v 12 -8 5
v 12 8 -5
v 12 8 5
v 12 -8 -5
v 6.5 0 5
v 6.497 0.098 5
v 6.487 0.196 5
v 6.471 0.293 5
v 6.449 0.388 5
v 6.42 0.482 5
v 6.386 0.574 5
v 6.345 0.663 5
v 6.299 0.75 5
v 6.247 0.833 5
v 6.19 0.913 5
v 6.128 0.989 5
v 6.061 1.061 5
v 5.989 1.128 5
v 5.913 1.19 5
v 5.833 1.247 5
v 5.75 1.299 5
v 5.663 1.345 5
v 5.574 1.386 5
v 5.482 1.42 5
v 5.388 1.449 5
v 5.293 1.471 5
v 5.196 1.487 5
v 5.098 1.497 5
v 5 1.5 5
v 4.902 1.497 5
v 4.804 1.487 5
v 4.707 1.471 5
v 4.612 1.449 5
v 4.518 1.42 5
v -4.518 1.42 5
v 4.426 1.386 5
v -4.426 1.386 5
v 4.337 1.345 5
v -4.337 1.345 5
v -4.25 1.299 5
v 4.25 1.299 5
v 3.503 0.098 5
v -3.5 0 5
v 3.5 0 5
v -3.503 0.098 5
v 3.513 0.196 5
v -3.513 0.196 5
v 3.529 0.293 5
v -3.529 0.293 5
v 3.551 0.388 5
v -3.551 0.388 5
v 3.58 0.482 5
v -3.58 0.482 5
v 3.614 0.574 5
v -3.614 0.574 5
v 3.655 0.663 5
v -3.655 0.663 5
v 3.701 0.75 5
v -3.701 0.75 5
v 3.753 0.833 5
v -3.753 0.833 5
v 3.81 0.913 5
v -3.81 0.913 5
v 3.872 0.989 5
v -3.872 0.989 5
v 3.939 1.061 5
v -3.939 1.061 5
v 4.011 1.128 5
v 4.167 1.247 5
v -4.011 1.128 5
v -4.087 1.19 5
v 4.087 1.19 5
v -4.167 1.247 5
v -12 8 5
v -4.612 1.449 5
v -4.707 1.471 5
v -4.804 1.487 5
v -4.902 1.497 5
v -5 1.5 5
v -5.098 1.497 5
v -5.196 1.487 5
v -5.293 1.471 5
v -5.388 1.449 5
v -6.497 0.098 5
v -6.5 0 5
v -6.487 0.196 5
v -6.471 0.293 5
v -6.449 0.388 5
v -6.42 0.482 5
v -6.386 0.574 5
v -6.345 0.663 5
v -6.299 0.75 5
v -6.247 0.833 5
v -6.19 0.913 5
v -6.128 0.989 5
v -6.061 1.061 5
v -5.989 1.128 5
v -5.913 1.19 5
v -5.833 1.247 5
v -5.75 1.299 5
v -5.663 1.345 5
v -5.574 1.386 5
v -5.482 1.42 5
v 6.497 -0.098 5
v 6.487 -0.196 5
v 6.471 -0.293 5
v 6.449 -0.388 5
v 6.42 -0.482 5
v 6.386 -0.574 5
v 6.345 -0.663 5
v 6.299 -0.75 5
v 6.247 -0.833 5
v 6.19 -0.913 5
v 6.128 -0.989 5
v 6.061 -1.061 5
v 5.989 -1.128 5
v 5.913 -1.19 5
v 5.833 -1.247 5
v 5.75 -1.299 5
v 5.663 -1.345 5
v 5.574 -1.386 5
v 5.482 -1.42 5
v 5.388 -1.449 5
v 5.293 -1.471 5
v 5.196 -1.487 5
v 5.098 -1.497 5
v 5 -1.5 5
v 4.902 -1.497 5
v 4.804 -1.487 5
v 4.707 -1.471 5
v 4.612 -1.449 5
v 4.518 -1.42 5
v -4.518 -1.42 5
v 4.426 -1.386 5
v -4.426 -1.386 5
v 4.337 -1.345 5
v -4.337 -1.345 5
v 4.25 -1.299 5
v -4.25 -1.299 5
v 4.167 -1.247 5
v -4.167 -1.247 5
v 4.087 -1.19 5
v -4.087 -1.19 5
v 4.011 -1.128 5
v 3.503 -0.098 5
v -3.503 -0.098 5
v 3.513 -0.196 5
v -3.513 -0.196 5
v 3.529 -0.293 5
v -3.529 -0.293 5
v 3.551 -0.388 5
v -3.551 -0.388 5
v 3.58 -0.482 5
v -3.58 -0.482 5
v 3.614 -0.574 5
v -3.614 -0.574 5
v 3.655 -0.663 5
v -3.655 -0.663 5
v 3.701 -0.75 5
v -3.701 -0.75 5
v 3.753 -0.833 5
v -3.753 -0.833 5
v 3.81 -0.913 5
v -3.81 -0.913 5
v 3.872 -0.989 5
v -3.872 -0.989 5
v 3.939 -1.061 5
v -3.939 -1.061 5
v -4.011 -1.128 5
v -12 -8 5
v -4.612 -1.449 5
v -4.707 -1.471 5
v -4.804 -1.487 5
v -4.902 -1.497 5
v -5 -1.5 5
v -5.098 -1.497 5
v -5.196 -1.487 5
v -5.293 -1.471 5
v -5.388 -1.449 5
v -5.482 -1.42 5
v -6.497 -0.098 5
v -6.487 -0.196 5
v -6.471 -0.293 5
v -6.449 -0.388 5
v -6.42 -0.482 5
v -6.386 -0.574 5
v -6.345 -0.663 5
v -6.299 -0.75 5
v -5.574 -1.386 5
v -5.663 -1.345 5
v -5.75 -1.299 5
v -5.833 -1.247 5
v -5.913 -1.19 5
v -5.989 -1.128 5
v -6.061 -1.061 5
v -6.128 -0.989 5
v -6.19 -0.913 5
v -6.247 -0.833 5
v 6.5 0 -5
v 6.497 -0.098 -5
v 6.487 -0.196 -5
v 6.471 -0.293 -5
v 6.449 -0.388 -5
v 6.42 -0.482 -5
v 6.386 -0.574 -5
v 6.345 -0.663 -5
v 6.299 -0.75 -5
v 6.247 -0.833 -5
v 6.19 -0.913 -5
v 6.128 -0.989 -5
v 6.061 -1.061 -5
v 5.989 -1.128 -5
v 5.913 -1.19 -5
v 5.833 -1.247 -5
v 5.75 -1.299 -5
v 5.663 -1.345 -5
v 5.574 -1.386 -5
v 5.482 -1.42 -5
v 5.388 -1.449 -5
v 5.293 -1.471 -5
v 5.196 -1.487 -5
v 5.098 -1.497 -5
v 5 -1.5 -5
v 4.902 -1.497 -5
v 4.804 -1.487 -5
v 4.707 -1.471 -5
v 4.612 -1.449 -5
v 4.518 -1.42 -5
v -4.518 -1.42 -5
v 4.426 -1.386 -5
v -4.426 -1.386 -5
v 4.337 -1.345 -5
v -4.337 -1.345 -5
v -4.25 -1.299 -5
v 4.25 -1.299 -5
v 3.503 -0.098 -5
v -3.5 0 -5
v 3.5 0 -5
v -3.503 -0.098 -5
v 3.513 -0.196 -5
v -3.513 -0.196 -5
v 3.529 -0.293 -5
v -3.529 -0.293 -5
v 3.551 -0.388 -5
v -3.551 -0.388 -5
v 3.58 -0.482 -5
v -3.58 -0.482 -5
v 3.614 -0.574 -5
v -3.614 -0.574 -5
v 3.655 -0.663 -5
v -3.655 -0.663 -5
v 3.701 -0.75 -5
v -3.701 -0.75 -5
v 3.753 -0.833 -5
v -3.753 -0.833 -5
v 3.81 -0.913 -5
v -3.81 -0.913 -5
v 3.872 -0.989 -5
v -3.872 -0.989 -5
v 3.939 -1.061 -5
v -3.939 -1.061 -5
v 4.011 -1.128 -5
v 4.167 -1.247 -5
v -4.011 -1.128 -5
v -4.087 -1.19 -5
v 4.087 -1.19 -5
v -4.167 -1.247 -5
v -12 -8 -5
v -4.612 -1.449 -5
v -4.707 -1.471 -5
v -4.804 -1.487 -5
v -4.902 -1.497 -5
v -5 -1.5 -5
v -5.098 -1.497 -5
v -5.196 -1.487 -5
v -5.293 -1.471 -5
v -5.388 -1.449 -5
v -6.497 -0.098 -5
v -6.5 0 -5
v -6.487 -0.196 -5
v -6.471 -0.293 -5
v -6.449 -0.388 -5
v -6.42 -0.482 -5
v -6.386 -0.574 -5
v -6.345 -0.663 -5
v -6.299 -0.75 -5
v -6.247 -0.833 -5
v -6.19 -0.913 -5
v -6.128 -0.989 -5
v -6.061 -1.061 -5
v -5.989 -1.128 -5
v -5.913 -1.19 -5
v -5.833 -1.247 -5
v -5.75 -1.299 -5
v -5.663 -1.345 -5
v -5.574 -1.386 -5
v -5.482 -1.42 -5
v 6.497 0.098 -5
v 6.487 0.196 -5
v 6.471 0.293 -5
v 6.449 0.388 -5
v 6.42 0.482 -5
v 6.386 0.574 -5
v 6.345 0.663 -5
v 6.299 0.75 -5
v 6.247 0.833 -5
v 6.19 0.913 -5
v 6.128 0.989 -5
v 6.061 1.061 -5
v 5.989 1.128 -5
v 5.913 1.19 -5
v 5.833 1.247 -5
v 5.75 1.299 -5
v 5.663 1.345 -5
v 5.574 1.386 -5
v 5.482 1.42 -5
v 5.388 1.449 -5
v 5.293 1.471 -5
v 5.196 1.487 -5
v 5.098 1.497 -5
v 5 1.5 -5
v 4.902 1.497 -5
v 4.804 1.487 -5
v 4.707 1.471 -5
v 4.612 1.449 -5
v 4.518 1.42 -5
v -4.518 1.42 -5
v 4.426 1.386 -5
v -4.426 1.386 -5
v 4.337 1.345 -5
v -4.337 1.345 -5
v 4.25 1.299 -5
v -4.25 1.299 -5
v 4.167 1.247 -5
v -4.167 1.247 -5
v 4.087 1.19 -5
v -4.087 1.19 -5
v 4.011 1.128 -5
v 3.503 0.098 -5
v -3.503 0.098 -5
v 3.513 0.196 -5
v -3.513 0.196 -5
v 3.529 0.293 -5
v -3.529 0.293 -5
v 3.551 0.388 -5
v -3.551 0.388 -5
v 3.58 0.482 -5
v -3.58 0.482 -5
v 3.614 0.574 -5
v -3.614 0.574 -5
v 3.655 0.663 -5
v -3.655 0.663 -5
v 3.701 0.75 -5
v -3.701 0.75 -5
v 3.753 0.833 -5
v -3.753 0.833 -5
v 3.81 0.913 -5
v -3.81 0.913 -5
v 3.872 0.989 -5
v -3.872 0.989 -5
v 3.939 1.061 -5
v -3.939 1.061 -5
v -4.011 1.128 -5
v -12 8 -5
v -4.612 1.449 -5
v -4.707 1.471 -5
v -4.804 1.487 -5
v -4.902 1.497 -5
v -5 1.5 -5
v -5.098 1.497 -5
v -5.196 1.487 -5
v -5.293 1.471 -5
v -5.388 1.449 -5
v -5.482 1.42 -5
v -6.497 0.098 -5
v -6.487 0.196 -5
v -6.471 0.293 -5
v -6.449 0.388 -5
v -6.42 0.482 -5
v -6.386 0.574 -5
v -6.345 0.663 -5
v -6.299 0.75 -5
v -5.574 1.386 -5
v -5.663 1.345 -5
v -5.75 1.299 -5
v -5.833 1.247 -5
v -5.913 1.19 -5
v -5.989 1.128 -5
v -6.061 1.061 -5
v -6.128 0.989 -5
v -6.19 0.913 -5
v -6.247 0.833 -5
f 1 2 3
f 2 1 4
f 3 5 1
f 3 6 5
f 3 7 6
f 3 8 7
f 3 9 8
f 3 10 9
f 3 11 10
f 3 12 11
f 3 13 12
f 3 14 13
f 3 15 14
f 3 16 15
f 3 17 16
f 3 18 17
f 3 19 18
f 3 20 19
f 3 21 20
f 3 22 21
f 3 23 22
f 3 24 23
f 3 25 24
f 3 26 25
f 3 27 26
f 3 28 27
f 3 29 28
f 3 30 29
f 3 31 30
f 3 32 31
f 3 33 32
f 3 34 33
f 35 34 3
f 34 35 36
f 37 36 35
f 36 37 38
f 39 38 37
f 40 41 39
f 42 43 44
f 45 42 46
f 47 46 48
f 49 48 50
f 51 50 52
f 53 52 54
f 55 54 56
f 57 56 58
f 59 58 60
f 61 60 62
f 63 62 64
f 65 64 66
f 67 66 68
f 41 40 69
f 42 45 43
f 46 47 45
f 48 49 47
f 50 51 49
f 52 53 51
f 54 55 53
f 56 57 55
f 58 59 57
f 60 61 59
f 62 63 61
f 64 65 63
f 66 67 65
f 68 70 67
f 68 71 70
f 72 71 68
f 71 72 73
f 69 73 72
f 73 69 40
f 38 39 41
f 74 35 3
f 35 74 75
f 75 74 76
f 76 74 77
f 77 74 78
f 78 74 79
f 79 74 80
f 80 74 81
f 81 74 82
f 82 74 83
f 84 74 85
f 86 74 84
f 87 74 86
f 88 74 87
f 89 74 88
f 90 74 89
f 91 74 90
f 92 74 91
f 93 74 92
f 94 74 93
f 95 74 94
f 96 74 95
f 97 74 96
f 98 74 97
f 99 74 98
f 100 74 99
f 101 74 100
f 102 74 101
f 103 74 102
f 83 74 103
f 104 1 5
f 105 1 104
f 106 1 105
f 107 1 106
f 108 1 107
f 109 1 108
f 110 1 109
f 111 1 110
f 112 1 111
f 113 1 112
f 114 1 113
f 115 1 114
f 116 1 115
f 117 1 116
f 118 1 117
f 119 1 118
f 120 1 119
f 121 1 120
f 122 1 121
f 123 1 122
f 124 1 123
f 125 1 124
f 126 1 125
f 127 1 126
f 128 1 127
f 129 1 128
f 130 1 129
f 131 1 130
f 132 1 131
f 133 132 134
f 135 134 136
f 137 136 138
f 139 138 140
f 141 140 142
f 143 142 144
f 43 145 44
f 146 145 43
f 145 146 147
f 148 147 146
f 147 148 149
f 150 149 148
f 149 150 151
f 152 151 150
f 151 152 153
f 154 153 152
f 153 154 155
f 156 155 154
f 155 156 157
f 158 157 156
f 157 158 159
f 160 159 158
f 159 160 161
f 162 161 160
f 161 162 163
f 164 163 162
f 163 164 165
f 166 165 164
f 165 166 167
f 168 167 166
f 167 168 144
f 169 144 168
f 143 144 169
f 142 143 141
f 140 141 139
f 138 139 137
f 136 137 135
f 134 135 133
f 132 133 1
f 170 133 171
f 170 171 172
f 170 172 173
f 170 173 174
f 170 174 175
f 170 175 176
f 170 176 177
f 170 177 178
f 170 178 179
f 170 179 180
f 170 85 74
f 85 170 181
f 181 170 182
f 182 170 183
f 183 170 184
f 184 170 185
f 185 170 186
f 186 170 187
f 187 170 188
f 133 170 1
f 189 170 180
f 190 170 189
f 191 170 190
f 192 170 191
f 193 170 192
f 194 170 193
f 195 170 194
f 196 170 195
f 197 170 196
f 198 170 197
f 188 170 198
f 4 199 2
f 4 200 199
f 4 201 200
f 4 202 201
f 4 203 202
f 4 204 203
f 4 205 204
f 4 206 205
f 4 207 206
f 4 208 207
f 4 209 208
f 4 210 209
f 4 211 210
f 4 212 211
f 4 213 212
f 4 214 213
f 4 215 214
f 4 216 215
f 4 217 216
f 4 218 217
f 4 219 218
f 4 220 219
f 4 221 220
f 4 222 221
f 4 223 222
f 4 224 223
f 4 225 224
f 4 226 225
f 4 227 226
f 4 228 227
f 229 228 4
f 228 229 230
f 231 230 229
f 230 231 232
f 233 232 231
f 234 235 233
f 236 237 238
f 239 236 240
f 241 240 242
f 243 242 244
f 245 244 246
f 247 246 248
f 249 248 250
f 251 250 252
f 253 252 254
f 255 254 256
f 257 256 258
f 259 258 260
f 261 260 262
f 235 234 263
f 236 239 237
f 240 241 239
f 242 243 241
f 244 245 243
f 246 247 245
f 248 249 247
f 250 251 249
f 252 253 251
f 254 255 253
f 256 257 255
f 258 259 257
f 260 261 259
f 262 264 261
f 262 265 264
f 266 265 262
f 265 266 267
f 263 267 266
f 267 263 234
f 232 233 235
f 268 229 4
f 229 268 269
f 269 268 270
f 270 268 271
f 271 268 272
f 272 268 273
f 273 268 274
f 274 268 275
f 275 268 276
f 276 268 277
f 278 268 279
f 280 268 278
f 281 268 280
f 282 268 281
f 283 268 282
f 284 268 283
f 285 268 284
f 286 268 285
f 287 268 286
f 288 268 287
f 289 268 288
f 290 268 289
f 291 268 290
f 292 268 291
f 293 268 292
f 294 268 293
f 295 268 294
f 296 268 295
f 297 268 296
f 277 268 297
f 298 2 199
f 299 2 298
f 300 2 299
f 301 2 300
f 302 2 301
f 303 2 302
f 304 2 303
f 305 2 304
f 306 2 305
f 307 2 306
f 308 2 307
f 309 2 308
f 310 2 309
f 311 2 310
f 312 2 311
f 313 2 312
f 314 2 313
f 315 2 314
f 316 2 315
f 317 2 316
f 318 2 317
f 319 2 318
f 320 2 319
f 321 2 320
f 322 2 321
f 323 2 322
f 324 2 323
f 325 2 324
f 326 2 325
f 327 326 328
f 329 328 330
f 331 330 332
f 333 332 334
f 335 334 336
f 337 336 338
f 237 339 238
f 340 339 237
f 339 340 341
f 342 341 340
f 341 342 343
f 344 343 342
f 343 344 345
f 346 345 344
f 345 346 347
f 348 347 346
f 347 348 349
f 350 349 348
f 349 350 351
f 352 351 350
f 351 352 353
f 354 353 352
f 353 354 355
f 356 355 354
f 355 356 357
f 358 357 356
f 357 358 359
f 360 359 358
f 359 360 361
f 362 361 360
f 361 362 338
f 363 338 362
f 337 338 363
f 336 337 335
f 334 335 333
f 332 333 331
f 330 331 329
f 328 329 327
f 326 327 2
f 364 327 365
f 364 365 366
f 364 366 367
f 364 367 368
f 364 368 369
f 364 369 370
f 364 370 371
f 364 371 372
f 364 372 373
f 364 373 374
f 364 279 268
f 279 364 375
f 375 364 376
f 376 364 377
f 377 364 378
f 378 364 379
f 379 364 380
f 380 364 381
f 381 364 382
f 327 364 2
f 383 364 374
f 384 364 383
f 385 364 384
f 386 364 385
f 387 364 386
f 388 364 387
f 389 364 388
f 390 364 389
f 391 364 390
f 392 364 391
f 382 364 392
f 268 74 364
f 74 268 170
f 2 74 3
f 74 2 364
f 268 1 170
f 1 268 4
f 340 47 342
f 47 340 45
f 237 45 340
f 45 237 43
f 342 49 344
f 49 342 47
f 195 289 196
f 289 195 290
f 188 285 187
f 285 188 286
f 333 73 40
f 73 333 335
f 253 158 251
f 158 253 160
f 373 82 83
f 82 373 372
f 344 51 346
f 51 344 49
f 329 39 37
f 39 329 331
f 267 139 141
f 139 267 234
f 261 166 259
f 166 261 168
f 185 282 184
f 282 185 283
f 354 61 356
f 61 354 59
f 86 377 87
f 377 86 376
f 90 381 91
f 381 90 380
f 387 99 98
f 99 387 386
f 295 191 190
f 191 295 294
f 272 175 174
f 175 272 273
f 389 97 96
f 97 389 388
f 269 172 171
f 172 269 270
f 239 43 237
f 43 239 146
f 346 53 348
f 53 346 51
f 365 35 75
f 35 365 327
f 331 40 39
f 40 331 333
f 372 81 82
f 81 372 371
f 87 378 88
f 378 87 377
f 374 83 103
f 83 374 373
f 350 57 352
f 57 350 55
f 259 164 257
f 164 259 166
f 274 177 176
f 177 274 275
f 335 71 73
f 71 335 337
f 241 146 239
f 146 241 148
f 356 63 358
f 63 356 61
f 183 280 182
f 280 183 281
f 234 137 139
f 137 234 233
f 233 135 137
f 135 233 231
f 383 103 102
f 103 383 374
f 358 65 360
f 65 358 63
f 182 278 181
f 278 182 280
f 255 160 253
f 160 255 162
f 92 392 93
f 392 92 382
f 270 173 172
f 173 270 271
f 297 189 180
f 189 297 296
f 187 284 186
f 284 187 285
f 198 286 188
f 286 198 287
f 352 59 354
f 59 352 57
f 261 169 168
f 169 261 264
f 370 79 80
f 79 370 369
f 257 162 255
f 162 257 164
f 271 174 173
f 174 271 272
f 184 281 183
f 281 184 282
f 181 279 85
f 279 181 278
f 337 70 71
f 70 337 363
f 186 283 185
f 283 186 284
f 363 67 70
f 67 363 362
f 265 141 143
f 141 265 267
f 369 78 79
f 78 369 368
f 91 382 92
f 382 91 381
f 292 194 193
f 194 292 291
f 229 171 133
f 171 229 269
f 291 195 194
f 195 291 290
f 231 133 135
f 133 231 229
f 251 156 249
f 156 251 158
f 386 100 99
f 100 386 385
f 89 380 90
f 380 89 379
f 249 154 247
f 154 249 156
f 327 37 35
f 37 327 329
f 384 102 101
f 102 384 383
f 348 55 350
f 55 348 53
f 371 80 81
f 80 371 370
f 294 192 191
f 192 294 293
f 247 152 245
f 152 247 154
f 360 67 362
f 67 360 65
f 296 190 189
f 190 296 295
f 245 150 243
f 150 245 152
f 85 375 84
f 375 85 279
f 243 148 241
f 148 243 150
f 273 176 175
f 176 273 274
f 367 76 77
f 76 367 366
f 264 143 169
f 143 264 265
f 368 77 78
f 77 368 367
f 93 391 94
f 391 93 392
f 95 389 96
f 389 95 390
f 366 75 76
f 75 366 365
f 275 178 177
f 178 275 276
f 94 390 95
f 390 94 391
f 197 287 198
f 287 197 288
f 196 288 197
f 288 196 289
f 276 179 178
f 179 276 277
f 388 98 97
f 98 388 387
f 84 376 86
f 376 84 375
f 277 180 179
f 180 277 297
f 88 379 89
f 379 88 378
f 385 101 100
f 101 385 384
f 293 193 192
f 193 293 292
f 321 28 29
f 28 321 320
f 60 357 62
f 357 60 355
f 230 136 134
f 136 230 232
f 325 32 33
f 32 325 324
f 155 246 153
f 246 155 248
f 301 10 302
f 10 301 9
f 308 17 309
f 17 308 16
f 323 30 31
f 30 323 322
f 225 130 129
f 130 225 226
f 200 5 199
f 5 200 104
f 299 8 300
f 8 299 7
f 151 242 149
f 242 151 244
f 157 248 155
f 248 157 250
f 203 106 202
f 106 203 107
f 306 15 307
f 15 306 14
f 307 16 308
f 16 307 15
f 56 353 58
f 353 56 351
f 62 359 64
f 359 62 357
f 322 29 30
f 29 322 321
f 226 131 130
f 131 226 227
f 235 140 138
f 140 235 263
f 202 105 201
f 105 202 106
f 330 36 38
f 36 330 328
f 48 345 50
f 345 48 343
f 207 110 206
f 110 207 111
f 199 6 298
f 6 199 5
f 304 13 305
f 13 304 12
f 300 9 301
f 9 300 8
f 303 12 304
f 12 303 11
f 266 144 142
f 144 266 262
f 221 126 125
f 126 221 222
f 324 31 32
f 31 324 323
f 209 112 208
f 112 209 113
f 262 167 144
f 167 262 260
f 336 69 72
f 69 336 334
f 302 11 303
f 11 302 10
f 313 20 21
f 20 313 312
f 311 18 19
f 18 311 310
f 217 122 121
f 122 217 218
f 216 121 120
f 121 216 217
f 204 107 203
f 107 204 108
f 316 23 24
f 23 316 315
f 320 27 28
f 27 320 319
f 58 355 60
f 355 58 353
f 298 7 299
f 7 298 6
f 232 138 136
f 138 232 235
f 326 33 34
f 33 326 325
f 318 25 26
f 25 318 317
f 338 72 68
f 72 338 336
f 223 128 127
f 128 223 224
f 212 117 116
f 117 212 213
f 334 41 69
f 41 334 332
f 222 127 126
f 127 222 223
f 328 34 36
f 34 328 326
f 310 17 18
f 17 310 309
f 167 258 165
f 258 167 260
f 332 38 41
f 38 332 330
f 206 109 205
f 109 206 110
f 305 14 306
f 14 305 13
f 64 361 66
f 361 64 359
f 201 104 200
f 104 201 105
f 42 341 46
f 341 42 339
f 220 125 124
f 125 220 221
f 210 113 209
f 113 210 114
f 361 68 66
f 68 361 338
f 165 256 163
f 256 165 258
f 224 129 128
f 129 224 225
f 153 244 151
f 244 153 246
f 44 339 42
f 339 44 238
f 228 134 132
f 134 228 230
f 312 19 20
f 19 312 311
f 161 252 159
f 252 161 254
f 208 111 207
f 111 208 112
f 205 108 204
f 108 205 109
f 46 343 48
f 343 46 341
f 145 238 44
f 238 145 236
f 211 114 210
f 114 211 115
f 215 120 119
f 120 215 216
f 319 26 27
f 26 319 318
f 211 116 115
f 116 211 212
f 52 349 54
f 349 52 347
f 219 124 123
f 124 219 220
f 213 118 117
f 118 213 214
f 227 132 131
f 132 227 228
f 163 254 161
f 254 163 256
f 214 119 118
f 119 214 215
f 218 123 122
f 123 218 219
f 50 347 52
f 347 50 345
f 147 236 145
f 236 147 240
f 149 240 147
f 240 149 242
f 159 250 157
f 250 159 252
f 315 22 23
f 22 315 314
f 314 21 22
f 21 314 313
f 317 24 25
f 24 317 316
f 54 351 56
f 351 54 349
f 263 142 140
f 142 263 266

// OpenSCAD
// Auto-generated from tests/data/feature_fixtures_manifest.json
// fixture: box_two_z_holes
// fixture_type: box
// description: Box with two z-axis through-holes offset symmetrically on X. Tests multi-hole counting.
$fn = 96;

box_size = [24.000000, 16.000000, 10.000000];
box_origin = [-12.000000, -8.000000, -5.000000];

module through_hole_x(center, diameter, length) {
  translate([box_origin[0] - 0.1, center[1], center[2]])
    rotate(a=90, v=[0, 1, 0]) cylinder(d=diameter, h=length, center=false);
}

module through_hole_y(center, diameter, length) {
  translate([center[0], box_origin[1] - 0.1, center[2]])
    rotate(a=90, v=[-1, 0, 0]) cylinder(d=diameter, h=length, center=false);
}

module through_hole_z(center, diameter, length) {
  translate([center[0], center[1], box_origin[2] - 0.1])
    cylinder(d=diameter, h=length, center=false);
}

difference() {
  translate(box_origin) cube(box_size);
  through_hole_z([-5.000000, 0.000000, 0.000000], 3.000000, 10.200000);  // hole_0
  through_hole_z([5.000000, 0.000000, 0.000000], 3.000000, 10.200000);  // hole_1
}
